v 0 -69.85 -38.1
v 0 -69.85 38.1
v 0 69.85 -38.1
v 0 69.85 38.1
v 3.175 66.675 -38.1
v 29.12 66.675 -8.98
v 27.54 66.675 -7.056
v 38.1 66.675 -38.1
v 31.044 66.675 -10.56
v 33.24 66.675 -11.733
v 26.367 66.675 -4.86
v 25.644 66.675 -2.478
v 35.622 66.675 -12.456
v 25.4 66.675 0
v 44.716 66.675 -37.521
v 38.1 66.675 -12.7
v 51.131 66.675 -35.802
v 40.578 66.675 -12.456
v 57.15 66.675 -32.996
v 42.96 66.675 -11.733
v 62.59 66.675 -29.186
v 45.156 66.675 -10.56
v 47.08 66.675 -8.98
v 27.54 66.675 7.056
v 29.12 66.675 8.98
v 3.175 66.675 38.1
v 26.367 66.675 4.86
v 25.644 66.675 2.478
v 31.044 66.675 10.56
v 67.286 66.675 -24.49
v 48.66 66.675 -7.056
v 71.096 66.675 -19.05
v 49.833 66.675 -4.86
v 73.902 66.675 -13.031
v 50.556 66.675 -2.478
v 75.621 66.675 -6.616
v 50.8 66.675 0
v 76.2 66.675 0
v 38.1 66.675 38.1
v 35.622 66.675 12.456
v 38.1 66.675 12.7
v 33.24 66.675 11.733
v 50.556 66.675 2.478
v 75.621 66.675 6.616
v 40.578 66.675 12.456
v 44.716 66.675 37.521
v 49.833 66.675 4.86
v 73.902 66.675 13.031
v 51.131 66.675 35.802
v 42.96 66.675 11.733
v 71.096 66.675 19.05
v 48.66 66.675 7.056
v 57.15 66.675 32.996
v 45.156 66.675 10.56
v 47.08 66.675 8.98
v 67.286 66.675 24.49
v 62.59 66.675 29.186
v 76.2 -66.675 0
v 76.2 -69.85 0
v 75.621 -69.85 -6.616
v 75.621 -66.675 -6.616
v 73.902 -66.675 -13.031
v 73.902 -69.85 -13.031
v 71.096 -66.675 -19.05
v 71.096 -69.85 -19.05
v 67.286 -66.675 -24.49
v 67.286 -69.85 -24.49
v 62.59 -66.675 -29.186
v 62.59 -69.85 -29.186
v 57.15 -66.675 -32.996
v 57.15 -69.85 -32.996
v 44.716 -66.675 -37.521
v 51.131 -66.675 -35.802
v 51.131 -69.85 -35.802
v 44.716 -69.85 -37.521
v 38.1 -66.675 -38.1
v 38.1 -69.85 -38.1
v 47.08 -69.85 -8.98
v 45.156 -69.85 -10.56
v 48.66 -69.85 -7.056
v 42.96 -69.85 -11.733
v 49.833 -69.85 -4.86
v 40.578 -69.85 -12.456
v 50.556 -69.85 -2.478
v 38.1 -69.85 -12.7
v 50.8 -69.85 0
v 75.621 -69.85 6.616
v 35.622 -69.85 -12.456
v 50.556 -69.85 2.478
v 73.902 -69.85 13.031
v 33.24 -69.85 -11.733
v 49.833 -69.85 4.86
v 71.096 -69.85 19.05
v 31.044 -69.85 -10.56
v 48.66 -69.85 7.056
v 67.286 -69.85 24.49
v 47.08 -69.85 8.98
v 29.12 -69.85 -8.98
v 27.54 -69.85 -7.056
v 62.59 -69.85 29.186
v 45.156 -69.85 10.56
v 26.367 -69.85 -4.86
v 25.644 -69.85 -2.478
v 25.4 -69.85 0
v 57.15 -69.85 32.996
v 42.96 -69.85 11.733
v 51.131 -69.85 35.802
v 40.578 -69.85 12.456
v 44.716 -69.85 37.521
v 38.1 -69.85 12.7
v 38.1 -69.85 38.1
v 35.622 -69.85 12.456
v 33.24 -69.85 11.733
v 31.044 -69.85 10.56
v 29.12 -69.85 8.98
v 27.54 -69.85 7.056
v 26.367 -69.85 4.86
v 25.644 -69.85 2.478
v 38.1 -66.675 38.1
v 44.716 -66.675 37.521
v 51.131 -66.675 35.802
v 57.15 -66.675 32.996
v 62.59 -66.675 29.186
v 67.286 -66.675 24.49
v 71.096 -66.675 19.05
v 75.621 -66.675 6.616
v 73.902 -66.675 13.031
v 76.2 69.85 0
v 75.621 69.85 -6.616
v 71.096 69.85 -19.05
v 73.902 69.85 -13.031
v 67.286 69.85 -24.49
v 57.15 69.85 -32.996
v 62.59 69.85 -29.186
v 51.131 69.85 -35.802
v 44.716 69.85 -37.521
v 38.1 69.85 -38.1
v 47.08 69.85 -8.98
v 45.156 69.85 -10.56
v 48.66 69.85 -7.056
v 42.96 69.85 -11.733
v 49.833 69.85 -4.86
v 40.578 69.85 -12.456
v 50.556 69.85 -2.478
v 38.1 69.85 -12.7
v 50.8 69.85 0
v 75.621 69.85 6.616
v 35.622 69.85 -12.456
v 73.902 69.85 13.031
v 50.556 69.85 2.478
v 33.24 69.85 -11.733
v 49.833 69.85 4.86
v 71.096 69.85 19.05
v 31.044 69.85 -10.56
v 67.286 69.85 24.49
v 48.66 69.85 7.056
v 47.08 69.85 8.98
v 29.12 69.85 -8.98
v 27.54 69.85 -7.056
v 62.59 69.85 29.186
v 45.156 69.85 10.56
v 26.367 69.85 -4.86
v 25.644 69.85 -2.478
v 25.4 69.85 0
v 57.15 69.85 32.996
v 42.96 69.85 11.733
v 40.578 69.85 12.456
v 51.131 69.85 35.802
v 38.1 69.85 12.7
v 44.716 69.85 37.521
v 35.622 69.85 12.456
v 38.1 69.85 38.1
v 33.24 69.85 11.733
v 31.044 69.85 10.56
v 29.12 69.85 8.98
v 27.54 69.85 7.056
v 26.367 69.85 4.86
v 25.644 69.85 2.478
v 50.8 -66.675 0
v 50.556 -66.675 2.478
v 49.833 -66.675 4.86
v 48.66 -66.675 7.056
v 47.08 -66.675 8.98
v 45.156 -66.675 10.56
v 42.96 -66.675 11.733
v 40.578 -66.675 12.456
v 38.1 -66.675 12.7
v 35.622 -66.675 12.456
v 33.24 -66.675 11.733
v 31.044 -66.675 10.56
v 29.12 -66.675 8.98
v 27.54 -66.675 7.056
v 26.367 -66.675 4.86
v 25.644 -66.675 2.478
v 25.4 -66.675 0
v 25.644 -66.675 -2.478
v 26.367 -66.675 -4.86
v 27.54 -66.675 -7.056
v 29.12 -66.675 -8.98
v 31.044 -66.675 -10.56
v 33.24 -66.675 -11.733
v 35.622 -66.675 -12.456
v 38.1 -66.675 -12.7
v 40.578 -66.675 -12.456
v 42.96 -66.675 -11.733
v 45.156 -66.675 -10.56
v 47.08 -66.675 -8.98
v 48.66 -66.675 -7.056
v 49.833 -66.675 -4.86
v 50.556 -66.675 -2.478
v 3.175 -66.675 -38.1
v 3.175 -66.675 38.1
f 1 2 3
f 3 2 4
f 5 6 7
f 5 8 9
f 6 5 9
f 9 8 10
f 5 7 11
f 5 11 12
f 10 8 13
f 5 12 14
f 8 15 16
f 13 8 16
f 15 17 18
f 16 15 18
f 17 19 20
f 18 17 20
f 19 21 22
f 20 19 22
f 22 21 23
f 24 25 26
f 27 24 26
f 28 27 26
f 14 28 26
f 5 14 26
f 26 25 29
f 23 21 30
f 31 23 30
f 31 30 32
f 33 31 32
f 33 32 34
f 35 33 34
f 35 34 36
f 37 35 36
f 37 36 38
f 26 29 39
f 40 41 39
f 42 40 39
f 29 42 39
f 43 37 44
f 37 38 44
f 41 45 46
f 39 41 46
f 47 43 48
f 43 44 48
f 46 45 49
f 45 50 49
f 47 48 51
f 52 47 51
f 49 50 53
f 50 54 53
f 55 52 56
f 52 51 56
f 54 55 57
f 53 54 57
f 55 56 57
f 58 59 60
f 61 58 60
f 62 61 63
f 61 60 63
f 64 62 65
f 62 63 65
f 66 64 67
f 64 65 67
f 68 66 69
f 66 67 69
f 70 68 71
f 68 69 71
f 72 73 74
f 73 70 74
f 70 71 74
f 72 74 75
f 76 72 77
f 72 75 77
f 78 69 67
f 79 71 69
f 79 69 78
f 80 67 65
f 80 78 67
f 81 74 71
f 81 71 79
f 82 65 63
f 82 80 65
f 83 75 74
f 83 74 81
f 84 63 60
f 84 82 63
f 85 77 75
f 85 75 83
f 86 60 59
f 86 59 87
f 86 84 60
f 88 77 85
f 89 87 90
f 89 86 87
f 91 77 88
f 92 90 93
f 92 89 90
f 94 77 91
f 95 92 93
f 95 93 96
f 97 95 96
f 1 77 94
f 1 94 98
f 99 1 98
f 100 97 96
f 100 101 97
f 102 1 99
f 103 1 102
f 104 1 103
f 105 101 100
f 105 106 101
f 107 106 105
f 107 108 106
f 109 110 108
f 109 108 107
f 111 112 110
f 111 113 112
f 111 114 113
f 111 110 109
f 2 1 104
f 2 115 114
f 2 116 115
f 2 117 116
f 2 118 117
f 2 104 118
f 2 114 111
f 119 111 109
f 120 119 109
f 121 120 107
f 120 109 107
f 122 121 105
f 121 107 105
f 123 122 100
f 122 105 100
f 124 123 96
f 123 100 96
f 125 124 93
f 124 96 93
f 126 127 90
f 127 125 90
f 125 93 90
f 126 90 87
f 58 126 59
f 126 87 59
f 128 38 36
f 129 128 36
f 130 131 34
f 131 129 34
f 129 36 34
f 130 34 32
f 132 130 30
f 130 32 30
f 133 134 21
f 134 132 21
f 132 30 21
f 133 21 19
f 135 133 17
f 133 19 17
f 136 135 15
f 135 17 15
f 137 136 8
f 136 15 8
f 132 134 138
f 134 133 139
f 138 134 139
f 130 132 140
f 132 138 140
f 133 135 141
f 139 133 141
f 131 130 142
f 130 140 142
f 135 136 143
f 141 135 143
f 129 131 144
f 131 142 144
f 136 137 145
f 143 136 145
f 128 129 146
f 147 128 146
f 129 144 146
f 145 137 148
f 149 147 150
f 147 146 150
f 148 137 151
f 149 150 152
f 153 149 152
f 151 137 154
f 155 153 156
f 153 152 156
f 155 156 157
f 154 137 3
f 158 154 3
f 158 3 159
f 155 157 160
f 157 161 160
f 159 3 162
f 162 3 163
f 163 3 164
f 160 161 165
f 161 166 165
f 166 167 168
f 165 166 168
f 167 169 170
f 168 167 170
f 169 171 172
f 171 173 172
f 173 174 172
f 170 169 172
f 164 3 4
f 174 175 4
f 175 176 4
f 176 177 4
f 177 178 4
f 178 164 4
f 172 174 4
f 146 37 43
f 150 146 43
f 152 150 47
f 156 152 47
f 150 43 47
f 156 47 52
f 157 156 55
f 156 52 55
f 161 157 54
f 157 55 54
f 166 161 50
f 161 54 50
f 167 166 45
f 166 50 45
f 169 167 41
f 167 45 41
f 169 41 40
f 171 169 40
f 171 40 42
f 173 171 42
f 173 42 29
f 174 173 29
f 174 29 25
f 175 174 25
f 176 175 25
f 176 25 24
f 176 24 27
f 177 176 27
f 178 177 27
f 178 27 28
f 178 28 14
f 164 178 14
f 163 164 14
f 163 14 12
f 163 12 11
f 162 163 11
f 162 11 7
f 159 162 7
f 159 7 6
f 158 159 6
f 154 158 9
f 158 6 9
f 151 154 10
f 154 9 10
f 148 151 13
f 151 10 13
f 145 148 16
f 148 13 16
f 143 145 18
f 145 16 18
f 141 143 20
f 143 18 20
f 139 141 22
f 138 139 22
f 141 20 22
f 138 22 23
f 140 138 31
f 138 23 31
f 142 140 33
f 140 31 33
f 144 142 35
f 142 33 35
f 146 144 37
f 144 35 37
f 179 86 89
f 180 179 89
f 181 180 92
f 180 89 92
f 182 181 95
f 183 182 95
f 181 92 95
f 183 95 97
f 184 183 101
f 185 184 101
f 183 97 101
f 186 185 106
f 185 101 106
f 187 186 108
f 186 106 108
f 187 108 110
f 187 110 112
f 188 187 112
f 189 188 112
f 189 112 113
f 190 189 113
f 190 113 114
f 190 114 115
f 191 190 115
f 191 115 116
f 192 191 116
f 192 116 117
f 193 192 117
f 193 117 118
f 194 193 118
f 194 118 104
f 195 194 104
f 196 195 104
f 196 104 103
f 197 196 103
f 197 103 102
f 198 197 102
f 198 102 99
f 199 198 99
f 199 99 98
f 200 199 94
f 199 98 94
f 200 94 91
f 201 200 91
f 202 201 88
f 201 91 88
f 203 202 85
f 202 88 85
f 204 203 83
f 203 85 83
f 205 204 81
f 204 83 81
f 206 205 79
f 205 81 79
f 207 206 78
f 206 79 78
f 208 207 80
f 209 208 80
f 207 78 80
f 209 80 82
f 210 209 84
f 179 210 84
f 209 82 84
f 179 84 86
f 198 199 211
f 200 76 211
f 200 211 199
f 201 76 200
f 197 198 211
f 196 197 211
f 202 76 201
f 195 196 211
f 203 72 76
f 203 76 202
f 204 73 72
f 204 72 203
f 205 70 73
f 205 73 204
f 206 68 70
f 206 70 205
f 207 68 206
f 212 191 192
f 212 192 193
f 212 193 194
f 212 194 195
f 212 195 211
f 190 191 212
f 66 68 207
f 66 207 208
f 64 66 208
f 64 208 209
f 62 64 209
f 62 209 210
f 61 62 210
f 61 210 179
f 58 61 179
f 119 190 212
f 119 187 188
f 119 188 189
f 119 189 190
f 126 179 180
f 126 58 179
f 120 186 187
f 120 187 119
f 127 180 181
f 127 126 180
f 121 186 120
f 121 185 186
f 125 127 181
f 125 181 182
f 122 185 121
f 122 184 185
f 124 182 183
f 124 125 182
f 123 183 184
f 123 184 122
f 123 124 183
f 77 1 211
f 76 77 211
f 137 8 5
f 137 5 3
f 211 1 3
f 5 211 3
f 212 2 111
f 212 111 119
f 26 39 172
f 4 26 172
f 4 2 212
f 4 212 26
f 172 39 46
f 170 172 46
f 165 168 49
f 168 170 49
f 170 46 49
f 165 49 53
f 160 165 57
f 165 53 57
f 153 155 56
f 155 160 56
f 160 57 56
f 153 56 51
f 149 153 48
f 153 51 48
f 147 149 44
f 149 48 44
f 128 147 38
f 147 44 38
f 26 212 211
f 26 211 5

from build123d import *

# Parameters (mm, degrees)
F0_W     = 139.7
F0_H     = 76.2
F1_DEPTH = 76.2
F2_W     = 133.35
F2_H     = 76.2
F3_DEPTH = 73.025
F4_R     = 12.7
F5_DEPTH = 171.196


with BuildPart() as f1:
    # F0 (on Right) → F1 (new body)
    with BuildSketch(Plane.YZ):
        Rectangle(F0_W, F0_H)
    extrude(amount=F1_DEPTH)

    # F2 (on face) → F3 (cut)
    with BuildSketch(Plane.YZ.offset(76.2)):
        Rectangle(F2_W, F2_H)
    extrude(amount=-F3_DEPTH, mode=Mode.SUBTRACT)

    # F4 (on face) → F5 (cut)
    with BuildSketch(Plane.XZ.offset(69.85)):
        with BuildLine():
            ThreePointArc((76.2, 0), (65.040768, -26.940768), (38.1, -38.1))
            Line((38.1, -38.1), (76.2, -38.1))
            Line((76.2, -38.1), (76.2, 0))
        make_face()
        with BuildLine():
            ThreePointArc((38.1, 38.1), (65.040768, 26.940768), (76.2, 0))
            Line((76.2, 0), (76.2, 38.1))
            Line((76.2, 38.1), (38.1, 38.1))
        make_face()
        with Locations((38.1, 0)):
            Circle(F4_R)
    extrude(amount=-F5_DEPTH, mode=Mode.SUBTRACT)


solid = f1.part
